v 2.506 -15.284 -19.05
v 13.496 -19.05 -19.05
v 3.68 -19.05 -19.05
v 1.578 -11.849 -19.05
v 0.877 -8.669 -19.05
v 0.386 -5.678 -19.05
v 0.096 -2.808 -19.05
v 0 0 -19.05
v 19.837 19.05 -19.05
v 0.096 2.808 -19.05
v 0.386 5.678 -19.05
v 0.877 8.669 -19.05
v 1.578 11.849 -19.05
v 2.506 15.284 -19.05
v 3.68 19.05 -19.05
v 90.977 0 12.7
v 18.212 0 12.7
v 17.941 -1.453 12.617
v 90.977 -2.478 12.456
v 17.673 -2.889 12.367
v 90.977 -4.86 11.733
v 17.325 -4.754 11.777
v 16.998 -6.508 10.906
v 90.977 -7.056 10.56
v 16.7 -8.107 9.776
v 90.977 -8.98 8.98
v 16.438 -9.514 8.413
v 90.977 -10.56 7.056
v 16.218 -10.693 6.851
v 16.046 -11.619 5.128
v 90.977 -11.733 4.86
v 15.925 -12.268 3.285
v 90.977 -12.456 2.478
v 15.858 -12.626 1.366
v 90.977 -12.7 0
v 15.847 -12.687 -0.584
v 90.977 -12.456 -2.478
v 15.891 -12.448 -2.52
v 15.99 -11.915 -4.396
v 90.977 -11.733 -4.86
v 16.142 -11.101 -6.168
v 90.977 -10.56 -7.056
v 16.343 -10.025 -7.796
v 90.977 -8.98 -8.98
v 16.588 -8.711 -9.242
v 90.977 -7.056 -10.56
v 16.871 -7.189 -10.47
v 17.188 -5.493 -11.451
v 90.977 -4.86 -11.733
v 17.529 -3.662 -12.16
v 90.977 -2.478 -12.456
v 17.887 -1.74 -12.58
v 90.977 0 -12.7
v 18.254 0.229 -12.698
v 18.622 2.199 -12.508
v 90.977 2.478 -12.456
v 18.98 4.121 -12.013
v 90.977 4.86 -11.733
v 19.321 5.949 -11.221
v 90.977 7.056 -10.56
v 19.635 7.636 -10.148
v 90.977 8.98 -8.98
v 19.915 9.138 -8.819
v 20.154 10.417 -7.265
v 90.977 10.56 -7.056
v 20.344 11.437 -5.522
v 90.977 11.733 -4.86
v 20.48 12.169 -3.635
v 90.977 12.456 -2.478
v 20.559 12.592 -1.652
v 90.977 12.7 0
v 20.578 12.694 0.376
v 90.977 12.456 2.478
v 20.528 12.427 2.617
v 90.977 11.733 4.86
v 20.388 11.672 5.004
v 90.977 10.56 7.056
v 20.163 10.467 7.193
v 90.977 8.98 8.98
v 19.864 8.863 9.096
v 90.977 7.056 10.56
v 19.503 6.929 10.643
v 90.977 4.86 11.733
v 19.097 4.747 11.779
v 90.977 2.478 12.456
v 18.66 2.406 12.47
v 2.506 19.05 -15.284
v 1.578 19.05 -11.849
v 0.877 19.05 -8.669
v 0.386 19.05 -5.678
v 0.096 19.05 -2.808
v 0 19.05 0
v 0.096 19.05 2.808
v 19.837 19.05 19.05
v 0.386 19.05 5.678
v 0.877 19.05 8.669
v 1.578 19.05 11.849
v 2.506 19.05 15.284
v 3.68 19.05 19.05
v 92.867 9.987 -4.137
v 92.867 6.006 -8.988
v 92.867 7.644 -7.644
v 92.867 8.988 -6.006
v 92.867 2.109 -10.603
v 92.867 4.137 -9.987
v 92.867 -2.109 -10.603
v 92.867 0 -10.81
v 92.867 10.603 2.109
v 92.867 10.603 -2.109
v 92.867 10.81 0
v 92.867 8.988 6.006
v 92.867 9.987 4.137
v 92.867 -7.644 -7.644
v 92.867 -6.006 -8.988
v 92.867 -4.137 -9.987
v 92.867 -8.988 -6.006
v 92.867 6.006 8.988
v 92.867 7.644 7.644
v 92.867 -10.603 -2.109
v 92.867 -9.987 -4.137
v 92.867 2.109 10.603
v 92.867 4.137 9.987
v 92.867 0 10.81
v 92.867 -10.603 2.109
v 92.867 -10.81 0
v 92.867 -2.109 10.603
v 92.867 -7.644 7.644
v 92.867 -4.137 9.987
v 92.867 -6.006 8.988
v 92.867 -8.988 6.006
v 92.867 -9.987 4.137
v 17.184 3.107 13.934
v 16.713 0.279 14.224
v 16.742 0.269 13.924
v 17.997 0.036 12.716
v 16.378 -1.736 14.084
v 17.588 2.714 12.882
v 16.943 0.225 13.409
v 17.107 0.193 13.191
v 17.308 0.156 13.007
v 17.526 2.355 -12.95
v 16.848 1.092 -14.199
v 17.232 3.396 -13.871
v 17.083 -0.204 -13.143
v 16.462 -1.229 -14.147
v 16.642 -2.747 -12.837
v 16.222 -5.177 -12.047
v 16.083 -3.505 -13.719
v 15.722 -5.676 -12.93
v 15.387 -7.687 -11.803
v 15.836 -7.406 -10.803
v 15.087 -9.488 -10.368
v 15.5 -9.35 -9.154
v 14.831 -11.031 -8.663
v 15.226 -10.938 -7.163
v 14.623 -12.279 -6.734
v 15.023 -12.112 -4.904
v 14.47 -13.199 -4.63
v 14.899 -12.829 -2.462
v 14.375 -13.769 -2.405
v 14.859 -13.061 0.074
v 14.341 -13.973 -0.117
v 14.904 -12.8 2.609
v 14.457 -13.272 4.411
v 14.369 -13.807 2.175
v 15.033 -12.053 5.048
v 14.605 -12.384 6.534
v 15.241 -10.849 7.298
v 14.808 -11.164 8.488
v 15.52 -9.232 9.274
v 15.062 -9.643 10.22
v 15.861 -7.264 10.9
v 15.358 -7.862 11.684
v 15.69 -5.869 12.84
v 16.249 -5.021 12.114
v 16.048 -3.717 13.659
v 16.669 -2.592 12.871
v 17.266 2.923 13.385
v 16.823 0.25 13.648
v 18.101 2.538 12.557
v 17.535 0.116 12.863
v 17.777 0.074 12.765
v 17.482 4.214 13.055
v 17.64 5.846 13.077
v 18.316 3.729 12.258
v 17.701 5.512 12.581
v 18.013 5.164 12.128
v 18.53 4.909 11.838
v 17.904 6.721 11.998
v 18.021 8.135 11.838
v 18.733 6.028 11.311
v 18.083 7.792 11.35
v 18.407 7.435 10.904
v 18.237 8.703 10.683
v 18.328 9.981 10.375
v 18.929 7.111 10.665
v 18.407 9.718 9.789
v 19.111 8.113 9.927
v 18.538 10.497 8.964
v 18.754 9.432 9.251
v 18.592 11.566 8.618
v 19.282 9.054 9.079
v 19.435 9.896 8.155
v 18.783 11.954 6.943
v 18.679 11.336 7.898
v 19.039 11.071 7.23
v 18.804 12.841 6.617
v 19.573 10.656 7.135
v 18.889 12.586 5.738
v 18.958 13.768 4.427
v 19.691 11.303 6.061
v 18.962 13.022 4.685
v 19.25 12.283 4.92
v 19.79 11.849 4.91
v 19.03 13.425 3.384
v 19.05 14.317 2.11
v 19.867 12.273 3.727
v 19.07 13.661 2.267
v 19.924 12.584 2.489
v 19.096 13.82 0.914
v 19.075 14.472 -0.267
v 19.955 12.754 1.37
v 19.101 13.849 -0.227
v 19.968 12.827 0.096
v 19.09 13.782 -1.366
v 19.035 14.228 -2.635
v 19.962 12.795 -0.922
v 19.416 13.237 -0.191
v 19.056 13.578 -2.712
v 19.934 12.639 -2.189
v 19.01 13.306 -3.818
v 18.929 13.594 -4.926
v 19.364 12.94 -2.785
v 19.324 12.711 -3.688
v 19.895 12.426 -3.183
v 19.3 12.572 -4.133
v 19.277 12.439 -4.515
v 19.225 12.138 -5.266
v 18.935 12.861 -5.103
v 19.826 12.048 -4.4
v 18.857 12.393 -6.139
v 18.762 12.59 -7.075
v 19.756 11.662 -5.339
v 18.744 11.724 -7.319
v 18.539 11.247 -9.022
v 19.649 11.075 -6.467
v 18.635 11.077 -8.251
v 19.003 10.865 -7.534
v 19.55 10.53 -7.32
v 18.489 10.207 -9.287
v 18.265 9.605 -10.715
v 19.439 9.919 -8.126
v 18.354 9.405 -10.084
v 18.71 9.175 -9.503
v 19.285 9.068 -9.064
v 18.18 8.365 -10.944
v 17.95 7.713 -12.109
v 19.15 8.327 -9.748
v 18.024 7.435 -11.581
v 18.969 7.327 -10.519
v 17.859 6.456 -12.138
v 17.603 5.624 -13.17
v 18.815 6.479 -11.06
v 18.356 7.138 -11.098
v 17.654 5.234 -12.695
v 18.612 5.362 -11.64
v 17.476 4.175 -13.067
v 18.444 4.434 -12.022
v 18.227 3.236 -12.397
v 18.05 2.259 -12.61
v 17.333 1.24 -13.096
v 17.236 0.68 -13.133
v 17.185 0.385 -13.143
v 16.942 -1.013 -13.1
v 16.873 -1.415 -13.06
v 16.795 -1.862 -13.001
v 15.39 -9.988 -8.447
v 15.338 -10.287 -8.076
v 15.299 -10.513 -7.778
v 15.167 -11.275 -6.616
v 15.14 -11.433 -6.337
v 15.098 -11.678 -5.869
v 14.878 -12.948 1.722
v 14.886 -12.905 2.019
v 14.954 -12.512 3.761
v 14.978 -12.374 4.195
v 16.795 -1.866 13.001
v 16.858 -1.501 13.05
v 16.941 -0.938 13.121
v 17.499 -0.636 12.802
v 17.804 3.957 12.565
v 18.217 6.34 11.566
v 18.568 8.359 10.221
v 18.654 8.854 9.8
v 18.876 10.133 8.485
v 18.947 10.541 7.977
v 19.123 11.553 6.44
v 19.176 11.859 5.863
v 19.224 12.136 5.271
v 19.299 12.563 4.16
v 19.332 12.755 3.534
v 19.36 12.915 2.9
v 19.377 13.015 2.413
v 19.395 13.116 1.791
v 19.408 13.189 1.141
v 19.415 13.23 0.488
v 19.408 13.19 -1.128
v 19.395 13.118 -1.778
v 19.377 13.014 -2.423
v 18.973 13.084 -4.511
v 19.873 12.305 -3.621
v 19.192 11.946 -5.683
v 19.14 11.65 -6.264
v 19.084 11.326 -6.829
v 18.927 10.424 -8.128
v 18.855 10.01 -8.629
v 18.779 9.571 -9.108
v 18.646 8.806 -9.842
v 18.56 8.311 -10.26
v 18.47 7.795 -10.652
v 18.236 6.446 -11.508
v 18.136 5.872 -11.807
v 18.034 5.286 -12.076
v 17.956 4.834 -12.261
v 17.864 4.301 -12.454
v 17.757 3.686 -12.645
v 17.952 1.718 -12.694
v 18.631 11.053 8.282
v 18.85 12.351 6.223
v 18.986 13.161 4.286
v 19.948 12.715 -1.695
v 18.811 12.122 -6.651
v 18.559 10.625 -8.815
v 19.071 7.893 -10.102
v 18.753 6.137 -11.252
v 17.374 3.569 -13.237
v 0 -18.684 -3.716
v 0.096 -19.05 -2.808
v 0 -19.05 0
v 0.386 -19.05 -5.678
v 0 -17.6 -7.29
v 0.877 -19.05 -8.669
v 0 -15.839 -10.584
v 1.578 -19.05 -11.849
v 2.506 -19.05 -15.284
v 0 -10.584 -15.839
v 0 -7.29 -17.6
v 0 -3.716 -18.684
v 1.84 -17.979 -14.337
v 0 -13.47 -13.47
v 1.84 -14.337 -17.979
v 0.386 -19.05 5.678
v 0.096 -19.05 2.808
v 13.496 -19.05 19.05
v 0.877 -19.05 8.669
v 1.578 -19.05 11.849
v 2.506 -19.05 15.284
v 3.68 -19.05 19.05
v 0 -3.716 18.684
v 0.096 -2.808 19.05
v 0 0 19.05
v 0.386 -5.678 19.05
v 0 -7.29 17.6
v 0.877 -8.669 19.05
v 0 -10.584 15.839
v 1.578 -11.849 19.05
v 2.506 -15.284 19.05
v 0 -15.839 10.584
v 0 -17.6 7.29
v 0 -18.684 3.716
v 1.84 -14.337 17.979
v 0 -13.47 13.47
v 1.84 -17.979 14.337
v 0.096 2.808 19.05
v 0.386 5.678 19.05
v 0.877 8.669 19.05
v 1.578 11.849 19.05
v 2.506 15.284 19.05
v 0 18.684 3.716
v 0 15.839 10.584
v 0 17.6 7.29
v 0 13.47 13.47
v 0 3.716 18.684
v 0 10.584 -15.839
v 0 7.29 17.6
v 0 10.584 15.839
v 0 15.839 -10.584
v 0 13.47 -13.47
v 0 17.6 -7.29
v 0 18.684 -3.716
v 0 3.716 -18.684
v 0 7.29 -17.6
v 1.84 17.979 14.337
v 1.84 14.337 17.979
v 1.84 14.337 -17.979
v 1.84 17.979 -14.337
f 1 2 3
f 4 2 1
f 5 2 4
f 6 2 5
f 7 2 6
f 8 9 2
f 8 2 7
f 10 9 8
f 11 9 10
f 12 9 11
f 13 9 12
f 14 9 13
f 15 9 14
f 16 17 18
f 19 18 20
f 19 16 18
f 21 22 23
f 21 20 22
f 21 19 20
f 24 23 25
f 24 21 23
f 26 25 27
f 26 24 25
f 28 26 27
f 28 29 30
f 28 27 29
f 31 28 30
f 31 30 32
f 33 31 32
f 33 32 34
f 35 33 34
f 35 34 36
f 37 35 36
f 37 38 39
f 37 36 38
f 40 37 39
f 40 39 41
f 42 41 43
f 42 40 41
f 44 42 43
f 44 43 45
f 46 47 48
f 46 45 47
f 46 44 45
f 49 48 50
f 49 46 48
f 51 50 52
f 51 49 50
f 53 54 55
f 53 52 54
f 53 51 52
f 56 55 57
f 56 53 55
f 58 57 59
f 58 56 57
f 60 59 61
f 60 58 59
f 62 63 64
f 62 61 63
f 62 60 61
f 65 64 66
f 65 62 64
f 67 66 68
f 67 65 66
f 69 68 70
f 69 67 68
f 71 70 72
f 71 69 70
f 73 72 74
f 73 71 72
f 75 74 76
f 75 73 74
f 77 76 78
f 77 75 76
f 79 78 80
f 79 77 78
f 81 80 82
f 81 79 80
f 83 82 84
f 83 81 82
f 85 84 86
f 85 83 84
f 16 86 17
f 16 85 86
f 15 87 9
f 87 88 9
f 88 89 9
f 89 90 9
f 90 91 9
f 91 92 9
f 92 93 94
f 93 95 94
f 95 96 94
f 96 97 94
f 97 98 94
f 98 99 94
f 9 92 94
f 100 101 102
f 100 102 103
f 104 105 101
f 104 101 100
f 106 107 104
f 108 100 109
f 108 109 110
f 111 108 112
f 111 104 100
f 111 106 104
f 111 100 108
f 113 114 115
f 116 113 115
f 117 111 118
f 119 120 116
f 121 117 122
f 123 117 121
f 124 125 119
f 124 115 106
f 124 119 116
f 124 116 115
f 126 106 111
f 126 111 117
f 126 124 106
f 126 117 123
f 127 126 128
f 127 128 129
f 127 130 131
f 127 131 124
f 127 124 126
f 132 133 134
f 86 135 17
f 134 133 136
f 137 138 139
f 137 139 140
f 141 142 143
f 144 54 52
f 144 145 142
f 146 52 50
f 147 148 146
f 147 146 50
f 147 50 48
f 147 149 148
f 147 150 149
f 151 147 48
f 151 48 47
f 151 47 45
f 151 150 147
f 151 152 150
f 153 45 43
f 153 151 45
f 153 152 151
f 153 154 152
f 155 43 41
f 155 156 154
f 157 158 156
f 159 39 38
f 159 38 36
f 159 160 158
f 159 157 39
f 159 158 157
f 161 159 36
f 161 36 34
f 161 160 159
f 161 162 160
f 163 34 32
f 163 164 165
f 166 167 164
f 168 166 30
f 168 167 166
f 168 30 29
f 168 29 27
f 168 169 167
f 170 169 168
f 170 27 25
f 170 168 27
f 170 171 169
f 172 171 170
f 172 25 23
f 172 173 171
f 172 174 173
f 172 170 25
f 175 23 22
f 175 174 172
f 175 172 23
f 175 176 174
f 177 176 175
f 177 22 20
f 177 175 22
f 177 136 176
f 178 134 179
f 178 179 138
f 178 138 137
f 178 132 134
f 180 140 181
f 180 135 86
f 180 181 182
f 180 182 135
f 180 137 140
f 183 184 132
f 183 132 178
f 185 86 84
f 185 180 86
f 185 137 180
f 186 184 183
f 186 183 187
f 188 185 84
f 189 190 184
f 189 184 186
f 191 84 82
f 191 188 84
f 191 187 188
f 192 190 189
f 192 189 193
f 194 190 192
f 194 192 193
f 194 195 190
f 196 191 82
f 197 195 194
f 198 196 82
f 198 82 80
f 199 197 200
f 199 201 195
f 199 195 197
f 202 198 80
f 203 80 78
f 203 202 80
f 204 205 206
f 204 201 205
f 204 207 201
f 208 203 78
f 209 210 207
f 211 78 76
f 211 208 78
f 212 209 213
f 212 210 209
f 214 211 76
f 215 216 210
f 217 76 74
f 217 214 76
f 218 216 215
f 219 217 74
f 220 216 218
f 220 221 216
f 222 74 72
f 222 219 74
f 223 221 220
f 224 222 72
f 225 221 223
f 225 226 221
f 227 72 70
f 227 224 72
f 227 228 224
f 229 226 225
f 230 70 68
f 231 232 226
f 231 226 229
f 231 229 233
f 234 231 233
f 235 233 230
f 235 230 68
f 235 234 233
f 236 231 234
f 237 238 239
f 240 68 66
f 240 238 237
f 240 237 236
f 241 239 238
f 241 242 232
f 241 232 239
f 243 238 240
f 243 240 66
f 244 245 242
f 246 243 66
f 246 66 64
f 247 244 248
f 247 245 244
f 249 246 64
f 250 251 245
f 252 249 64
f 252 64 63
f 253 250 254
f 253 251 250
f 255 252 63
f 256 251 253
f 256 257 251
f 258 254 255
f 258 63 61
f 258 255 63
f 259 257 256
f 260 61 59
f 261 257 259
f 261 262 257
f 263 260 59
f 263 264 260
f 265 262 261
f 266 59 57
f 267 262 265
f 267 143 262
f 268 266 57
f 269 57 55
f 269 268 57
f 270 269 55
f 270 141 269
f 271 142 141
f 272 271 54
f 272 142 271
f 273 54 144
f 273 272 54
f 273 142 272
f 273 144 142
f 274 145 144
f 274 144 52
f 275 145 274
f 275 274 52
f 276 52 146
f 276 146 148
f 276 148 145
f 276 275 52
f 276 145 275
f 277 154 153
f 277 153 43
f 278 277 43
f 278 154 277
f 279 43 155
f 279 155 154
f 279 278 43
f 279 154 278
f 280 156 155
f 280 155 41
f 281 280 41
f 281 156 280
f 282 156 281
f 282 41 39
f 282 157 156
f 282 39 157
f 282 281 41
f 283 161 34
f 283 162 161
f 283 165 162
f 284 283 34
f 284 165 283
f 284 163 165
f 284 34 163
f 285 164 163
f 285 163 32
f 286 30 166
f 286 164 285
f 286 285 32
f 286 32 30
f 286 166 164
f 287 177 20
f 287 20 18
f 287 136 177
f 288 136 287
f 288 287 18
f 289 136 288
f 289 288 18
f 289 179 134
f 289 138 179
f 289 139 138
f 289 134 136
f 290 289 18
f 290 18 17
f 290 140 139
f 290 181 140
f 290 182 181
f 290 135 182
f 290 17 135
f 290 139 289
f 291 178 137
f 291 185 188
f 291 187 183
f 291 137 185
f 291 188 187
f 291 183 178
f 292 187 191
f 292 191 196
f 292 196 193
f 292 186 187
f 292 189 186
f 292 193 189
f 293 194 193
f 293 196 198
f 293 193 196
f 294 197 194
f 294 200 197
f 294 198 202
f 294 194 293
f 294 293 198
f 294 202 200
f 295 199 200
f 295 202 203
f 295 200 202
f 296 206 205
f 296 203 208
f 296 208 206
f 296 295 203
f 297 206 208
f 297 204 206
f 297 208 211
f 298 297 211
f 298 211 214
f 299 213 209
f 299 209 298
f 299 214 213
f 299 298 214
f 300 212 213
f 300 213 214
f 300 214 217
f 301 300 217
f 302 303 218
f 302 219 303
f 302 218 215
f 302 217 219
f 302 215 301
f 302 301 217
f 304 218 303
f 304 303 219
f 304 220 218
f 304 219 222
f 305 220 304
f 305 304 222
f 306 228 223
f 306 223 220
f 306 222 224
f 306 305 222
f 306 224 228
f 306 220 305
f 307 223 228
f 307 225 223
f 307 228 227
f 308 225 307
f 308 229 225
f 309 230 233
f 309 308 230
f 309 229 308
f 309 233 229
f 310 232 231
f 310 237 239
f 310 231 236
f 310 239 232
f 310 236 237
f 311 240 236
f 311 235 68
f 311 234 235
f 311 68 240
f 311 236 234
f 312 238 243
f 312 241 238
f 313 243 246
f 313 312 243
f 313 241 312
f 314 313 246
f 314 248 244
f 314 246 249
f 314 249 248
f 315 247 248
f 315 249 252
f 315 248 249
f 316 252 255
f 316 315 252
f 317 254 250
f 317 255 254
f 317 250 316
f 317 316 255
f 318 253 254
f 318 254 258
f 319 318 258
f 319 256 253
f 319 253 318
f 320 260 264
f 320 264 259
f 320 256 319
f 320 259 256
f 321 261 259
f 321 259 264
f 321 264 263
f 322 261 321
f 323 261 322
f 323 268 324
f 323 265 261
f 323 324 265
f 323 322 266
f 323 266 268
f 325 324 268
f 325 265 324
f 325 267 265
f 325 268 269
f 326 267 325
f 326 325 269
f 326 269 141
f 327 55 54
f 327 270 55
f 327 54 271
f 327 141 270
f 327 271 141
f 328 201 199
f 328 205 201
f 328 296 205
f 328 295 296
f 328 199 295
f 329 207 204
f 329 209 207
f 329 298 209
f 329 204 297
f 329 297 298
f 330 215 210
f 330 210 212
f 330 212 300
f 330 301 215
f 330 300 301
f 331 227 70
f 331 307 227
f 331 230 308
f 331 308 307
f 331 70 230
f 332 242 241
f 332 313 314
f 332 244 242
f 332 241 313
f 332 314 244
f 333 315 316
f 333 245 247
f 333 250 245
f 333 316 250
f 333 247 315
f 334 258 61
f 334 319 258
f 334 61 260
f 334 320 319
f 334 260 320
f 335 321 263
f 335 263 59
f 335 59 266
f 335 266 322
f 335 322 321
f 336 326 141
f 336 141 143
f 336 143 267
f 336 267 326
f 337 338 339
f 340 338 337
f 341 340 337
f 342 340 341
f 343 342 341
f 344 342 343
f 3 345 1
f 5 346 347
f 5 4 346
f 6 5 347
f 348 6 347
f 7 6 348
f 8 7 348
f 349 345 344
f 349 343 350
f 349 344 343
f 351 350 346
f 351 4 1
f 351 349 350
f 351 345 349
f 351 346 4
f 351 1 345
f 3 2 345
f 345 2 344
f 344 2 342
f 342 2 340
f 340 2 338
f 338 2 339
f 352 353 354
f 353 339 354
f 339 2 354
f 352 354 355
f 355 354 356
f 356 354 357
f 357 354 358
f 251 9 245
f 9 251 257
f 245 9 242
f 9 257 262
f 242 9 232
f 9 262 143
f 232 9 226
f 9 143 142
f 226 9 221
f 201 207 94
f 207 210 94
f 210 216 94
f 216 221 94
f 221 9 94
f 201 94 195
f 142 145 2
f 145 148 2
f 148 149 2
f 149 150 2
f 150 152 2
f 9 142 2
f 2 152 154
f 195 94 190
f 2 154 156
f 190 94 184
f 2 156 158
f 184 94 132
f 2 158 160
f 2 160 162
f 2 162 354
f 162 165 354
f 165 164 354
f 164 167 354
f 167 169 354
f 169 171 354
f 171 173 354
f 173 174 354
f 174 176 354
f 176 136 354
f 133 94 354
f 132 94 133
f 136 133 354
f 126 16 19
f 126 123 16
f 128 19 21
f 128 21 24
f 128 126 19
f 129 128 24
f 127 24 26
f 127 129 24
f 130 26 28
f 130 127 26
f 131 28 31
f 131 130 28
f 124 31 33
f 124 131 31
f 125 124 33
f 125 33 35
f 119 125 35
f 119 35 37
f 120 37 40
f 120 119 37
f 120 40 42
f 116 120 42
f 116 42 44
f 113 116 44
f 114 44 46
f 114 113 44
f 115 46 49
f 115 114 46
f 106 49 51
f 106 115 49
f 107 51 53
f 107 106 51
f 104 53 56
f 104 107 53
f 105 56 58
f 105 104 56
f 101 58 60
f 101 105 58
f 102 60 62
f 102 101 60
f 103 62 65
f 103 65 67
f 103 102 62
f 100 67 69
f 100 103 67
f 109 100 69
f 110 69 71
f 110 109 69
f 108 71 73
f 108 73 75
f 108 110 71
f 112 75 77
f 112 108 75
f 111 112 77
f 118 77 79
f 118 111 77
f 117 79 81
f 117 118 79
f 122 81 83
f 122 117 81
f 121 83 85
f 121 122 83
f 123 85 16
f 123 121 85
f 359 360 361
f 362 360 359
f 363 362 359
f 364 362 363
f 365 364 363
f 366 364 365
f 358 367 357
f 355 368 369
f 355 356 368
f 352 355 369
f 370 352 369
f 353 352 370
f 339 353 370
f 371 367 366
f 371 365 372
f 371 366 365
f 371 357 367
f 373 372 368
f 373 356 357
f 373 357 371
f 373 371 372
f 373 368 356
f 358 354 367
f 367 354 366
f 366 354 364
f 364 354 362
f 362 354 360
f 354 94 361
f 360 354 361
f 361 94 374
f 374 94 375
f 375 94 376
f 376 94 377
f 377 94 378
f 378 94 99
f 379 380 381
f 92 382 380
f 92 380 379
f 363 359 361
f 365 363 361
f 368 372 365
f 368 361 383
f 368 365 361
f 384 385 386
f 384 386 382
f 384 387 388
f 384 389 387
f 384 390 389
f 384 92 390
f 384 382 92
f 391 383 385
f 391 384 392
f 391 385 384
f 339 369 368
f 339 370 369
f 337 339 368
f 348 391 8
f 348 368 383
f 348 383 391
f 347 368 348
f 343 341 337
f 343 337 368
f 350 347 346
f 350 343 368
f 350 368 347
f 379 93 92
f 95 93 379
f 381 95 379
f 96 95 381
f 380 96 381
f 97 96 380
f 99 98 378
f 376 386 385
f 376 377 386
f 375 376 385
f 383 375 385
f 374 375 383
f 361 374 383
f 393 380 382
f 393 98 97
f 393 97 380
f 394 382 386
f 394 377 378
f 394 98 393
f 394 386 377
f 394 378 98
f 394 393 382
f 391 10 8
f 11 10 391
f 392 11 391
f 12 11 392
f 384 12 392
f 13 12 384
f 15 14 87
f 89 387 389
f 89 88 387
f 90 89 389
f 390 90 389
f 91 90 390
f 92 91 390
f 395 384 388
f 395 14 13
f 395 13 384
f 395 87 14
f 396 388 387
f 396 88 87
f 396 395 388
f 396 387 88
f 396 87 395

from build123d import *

# Parameters (mm, degrees)
BASEHEAD_DEPTH = 19.05
HEADFILLET_R   = 1.524


with BuildPart() as part:
    # Sketch1 → BaseHead (new, symmetric)
    with BuildSketch(Plane.XY):
        Polygon((0, -19.05), (0, 19.05), (19.8374, 19.05), (13.495821211, -19.05), align=None)
    extrude(amount=BASEHEAD_DEPTH, both=True)

    # BodySke → Body (revolve)
    with BuildSketch(Plane.XY, mode=Mode.PRIVATE) as body_sk:
        Polygon((0, 0), (0, 12.7), (90.976850605, 12.7), (92.866610605, 10.81024), (92.866610605, 0), align=None)
    revolve(body_sk.sketch.rotate(Axis((0, 0, 0), (1, 0, 0)), 90), axis=Axis((0, 0, 0), (1, 0, 0)))

    # Sketch3 → HeadChamfer (revolve, cut)
    with BuildSketch(Plane(origin=(0, 0, 0), x_dir=(1, 0, 0), z_dir=(0, -0.7071067811865476, 0.7071067811865475))):
        Polygon((0, 19.05), (9.601632975, 39.640768363), (-6.35, 39.640768363), (-6.35, 19.05), align=None)
    revolve(axis=Axis((0, 0, 0), (1, 0, 0)), mode=Mode.SUBTRACT)

    # HeadFillet
    headfillet_edges = [part.edges().sort_by_distance(p)[0] for p in [
        (16.666610593, -7.7e-08, -12.7),
    ]]
    fillet(headfillet_edges, radius=HEADFILLET_R)


solid = part.part
